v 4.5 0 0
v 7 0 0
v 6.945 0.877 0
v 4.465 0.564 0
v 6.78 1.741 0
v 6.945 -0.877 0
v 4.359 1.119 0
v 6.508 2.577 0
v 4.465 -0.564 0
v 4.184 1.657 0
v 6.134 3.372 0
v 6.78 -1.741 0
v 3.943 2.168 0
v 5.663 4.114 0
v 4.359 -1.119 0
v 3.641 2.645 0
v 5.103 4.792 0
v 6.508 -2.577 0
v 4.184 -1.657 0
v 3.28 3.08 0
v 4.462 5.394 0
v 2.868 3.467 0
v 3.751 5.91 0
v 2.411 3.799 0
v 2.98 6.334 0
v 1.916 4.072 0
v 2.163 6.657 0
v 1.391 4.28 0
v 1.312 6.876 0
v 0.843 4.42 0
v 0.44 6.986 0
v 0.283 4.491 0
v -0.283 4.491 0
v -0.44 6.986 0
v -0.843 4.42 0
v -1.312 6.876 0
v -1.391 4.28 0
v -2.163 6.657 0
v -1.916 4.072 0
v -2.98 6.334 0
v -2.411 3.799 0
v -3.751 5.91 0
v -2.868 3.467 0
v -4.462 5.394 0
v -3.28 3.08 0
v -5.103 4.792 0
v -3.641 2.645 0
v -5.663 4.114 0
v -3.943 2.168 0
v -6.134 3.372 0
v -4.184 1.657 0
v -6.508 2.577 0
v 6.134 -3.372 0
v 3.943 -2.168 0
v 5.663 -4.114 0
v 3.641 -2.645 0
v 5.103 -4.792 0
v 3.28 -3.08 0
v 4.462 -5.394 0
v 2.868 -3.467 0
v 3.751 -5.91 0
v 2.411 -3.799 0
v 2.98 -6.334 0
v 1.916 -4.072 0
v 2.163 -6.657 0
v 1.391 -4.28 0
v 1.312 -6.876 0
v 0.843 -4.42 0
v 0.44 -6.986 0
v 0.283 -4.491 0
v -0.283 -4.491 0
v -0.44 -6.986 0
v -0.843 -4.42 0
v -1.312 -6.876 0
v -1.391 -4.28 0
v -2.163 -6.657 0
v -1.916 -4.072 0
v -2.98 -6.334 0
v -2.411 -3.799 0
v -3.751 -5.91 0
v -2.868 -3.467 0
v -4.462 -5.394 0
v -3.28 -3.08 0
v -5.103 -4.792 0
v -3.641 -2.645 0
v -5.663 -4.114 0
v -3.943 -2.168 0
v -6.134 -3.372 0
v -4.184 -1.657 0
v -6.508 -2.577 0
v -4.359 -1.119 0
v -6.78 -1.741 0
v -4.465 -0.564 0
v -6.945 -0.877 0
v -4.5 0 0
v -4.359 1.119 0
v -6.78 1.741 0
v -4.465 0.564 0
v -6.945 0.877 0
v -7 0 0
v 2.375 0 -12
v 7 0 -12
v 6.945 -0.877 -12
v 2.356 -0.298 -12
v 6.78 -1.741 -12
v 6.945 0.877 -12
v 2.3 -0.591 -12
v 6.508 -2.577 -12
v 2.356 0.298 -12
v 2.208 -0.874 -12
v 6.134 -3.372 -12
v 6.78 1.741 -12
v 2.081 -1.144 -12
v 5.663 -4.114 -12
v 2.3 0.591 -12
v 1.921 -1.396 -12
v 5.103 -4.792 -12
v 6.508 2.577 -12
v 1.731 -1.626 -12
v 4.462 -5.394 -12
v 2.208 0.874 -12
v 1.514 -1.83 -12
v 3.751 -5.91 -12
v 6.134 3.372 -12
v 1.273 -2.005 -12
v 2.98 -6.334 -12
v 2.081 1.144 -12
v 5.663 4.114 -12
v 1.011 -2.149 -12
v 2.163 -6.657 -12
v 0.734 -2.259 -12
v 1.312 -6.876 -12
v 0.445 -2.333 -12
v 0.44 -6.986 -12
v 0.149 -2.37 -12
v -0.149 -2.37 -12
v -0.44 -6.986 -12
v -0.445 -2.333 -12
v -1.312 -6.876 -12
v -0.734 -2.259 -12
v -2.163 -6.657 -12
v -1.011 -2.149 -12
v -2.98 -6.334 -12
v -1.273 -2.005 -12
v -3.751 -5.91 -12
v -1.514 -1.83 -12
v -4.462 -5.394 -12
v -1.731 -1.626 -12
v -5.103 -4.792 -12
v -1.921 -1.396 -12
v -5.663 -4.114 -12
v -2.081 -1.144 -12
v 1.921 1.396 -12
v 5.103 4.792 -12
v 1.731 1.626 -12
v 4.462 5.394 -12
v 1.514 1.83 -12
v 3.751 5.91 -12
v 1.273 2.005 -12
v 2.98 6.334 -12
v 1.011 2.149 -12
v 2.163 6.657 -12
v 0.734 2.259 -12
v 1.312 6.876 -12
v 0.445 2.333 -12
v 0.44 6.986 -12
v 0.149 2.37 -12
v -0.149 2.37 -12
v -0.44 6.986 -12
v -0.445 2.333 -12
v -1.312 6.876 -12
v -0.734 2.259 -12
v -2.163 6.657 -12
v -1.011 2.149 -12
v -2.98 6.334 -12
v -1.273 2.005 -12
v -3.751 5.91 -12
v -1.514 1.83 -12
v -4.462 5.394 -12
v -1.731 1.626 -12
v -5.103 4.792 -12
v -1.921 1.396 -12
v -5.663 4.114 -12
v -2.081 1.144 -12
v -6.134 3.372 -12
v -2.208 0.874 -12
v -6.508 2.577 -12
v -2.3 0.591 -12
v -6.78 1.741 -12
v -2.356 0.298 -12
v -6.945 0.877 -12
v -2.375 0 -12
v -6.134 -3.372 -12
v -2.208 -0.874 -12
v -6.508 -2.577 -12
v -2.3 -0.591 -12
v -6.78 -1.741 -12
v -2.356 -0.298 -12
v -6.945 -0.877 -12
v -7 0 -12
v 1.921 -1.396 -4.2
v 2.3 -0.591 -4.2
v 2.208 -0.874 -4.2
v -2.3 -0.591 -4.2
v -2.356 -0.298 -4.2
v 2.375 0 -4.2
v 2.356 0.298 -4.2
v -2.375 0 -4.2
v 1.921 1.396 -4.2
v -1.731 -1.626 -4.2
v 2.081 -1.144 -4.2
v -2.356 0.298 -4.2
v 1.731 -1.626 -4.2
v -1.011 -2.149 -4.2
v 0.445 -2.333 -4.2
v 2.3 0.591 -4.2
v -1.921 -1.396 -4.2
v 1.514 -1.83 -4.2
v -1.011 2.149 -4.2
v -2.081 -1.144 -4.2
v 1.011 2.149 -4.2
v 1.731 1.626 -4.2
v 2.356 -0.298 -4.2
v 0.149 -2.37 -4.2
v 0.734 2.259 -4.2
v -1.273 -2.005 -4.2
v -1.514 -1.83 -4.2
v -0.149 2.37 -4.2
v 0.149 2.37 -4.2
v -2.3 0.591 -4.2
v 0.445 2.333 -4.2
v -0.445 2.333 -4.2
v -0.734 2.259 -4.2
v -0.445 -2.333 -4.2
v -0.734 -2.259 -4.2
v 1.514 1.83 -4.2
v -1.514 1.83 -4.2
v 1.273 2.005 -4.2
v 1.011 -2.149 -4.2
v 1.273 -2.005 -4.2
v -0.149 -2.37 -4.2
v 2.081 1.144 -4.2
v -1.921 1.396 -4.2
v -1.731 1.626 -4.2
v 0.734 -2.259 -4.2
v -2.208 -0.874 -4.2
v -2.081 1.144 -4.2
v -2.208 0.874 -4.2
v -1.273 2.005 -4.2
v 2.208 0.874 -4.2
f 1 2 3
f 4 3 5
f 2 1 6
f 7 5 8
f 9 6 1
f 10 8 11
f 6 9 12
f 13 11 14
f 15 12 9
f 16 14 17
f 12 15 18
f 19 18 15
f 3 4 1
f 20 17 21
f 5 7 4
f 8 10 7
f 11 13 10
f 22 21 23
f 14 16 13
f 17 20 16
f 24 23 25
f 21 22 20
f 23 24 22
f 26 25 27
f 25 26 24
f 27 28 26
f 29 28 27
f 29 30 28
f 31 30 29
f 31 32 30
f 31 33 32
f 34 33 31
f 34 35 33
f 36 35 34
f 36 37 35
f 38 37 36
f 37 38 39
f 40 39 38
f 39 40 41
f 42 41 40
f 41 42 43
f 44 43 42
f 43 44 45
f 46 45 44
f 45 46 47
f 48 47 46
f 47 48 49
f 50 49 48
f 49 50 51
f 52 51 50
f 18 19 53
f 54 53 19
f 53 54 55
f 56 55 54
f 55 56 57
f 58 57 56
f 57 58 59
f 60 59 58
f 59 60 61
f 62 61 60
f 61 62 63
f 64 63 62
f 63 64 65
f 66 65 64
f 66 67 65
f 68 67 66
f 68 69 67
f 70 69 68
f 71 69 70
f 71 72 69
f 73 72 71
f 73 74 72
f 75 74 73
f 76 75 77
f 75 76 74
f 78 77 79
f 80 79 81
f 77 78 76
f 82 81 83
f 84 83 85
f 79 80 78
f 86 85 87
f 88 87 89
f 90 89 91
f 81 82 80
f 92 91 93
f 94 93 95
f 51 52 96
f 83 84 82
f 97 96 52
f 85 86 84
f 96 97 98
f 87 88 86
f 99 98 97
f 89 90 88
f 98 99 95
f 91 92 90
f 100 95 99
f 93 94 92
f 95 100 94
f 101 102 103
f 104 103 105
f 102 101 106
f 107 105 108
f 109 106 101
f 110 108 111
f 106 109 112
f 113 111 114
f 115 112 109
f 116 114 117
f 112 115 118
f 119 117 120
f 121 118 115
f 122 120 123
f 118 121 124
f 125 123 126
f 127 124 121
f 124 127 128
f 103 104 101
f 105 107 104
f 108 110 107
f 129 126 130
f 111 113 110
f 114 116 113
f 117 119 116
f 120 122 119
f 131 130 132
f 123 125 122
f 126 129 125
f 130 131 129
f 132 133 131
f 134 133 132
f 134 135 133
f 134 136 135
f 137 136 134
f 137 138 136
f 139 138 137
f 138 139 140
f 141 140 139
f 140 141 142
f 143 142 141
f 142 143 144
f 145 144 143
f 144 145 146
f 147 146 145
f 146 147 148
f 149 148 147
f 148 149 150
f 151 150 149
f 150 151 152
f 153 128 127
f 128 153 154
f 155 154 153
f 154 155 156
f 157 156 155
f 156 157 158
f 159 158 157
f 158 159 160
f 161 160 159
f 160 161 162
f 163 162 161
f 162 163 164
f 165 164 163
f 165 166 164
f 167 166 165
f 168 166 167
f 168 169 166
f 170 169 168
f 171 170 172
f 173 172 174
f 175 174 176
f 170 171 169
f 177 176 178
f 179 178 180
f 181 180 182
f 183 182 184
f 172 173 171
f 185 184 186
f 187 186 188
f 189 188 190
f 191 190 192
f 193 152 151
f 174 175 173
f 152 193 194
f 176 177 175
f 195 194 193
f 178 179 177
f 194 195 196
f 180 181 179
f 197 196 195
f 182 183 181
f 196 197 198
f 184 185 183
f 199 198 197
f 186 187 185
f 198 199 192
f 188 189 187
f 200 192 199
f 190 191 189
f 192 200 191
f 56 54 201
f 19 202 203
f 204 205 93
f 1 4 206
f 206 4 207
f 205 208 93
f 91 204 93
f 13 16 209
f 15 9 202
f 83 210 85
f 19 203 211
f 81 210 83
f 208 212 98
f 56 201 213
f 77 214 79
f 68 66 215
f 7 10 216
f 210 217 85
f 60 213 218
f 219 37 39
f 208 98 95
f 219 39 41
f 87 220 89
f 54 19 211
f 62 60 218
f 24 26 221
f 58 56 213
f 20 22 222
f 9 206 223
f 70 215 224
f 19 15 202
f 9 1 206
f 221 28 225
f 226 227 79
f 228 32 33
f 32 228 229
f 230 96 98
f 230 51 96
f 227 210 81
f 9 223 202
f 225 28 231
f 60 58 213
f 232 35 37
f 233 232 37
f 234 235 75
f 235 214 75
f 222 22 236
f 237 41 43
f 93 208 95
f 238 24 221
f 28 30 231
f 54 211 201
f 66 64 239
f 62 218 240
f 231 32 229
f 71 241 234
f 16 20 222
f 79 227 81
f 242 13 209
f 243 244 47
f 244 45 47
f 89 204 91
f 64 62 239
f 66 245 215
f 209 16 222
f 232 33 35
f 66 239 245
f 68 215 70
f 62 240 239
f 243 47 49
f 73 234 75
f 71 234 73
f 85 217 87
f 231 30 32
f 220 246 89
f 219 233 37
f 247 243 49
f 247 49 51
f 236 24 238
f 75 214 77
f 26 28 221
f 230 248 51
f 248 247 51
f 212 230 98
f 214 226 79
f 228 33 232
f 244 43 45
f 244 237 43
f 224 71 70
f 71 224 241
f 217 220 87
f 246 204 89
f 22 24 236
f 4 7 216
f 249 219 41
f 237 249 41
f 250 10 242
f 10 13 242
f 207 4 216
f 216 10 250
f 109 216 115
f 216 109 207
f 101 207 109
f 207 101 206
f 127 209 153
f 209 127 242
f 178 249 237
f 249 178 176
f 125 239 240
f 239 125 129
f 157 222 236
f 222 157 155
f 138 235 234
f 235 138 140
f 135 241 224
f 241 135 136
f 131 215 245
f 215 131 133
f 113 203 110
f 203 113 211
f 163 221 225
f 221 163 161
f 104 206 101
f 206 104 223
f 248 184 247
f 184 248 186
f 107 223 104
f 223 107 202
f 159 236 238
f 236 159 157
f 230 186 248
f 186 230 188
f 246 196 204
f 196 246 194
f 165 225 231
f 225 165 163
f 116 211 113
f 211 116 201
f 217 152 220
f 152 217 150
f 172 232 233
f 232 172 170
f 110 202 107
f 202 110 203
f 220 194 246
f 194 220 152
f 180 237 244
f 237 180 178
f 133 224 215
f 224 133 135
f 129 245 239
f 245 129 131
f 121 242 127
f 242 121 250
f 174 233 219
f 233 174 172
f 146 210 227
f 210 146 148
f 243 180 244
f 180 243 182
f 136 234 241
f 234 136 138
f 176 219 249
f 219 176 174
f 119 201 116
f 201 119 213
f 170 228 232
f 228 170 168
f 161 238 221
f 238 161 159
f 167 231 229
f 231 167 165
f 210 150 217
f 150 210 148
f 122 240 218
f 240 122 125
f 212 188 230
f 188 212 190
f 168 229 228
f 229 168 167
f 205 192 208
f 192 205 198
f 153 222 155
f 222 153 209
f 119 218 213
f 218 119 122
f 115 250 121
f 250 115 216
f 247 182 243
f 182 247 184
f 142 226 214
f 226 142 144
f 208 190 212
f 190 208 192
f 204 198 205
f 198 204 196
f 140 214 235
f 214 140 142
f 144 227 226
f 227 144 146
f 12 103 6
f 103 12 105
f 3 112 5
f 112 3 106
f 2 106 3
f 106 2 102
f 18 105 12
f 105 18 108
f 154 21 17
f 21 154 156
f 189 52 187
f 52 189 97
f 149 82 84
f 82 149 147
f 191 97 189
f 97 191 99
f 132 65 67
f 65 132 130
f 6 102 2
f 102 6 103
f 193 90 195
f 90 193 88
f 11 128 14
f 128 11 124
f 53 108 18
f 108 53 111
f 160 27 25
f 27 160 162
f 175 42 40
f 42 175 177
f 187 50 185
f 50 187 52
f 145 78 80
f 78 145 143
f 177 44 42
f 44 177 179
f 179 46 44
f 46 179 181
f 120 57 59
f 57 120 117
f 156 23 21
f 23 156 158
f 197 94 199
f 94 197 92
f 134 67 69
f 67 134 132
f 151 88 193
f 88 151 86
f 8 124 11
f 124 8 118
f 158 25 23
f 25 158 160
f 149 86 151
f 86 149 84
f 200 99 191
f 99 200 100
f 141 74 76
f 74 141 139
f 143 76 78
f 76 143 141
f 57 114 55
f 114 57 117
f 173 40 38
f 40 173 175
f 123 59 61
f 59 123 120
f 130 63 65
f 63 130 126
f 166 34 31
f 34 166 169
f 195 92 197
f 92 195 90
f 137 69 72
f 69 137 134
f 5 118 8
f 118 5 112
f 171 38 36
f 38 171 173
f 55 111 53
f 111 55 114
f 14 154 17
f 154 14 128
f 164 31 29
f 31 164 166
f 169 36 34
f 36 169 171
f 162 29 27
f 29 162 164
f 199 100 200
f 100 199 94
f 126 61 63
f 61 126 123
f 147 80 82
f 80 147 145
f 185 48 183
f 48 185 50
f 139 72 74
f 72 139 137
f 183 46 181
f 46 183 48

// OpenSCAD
$fn = 50;


difference() {
	union() {
		translate(v = [0, 0, -12.0000000000]) {
			cylinder(h = 12, r = 7.0000000000);
		}
		cylinder(h = 0, r = 16.0000000000);
	}
	union() {
		translate(v = [0, 0, 0]) {
			rotate(a = [0, 0, 0]) {
				difference() {
					union() {
						#translate(v = [0, 0, -12.0000000000]) {
							cylinder(h = 12, r = 2.2500000000);
						}
						#translate(v = [0, 0, -4.2000000000]) {
							cylinder(h = 4.2000000000, r = 7.0000000000, r1 = 2.3750000000, r2 = 4.5000000000);
						}
						#translate(v = [0, 0, -12.0000000000]) {
							cylinder(h = 12, r = 2.3750000000);
						}
						#translate(v = [0, 0, -12.0000000000]) {
							cylinder(h = 12, r = 2.2500000000);
						}
					}
					union();
				}
			}
		}
	}
}
